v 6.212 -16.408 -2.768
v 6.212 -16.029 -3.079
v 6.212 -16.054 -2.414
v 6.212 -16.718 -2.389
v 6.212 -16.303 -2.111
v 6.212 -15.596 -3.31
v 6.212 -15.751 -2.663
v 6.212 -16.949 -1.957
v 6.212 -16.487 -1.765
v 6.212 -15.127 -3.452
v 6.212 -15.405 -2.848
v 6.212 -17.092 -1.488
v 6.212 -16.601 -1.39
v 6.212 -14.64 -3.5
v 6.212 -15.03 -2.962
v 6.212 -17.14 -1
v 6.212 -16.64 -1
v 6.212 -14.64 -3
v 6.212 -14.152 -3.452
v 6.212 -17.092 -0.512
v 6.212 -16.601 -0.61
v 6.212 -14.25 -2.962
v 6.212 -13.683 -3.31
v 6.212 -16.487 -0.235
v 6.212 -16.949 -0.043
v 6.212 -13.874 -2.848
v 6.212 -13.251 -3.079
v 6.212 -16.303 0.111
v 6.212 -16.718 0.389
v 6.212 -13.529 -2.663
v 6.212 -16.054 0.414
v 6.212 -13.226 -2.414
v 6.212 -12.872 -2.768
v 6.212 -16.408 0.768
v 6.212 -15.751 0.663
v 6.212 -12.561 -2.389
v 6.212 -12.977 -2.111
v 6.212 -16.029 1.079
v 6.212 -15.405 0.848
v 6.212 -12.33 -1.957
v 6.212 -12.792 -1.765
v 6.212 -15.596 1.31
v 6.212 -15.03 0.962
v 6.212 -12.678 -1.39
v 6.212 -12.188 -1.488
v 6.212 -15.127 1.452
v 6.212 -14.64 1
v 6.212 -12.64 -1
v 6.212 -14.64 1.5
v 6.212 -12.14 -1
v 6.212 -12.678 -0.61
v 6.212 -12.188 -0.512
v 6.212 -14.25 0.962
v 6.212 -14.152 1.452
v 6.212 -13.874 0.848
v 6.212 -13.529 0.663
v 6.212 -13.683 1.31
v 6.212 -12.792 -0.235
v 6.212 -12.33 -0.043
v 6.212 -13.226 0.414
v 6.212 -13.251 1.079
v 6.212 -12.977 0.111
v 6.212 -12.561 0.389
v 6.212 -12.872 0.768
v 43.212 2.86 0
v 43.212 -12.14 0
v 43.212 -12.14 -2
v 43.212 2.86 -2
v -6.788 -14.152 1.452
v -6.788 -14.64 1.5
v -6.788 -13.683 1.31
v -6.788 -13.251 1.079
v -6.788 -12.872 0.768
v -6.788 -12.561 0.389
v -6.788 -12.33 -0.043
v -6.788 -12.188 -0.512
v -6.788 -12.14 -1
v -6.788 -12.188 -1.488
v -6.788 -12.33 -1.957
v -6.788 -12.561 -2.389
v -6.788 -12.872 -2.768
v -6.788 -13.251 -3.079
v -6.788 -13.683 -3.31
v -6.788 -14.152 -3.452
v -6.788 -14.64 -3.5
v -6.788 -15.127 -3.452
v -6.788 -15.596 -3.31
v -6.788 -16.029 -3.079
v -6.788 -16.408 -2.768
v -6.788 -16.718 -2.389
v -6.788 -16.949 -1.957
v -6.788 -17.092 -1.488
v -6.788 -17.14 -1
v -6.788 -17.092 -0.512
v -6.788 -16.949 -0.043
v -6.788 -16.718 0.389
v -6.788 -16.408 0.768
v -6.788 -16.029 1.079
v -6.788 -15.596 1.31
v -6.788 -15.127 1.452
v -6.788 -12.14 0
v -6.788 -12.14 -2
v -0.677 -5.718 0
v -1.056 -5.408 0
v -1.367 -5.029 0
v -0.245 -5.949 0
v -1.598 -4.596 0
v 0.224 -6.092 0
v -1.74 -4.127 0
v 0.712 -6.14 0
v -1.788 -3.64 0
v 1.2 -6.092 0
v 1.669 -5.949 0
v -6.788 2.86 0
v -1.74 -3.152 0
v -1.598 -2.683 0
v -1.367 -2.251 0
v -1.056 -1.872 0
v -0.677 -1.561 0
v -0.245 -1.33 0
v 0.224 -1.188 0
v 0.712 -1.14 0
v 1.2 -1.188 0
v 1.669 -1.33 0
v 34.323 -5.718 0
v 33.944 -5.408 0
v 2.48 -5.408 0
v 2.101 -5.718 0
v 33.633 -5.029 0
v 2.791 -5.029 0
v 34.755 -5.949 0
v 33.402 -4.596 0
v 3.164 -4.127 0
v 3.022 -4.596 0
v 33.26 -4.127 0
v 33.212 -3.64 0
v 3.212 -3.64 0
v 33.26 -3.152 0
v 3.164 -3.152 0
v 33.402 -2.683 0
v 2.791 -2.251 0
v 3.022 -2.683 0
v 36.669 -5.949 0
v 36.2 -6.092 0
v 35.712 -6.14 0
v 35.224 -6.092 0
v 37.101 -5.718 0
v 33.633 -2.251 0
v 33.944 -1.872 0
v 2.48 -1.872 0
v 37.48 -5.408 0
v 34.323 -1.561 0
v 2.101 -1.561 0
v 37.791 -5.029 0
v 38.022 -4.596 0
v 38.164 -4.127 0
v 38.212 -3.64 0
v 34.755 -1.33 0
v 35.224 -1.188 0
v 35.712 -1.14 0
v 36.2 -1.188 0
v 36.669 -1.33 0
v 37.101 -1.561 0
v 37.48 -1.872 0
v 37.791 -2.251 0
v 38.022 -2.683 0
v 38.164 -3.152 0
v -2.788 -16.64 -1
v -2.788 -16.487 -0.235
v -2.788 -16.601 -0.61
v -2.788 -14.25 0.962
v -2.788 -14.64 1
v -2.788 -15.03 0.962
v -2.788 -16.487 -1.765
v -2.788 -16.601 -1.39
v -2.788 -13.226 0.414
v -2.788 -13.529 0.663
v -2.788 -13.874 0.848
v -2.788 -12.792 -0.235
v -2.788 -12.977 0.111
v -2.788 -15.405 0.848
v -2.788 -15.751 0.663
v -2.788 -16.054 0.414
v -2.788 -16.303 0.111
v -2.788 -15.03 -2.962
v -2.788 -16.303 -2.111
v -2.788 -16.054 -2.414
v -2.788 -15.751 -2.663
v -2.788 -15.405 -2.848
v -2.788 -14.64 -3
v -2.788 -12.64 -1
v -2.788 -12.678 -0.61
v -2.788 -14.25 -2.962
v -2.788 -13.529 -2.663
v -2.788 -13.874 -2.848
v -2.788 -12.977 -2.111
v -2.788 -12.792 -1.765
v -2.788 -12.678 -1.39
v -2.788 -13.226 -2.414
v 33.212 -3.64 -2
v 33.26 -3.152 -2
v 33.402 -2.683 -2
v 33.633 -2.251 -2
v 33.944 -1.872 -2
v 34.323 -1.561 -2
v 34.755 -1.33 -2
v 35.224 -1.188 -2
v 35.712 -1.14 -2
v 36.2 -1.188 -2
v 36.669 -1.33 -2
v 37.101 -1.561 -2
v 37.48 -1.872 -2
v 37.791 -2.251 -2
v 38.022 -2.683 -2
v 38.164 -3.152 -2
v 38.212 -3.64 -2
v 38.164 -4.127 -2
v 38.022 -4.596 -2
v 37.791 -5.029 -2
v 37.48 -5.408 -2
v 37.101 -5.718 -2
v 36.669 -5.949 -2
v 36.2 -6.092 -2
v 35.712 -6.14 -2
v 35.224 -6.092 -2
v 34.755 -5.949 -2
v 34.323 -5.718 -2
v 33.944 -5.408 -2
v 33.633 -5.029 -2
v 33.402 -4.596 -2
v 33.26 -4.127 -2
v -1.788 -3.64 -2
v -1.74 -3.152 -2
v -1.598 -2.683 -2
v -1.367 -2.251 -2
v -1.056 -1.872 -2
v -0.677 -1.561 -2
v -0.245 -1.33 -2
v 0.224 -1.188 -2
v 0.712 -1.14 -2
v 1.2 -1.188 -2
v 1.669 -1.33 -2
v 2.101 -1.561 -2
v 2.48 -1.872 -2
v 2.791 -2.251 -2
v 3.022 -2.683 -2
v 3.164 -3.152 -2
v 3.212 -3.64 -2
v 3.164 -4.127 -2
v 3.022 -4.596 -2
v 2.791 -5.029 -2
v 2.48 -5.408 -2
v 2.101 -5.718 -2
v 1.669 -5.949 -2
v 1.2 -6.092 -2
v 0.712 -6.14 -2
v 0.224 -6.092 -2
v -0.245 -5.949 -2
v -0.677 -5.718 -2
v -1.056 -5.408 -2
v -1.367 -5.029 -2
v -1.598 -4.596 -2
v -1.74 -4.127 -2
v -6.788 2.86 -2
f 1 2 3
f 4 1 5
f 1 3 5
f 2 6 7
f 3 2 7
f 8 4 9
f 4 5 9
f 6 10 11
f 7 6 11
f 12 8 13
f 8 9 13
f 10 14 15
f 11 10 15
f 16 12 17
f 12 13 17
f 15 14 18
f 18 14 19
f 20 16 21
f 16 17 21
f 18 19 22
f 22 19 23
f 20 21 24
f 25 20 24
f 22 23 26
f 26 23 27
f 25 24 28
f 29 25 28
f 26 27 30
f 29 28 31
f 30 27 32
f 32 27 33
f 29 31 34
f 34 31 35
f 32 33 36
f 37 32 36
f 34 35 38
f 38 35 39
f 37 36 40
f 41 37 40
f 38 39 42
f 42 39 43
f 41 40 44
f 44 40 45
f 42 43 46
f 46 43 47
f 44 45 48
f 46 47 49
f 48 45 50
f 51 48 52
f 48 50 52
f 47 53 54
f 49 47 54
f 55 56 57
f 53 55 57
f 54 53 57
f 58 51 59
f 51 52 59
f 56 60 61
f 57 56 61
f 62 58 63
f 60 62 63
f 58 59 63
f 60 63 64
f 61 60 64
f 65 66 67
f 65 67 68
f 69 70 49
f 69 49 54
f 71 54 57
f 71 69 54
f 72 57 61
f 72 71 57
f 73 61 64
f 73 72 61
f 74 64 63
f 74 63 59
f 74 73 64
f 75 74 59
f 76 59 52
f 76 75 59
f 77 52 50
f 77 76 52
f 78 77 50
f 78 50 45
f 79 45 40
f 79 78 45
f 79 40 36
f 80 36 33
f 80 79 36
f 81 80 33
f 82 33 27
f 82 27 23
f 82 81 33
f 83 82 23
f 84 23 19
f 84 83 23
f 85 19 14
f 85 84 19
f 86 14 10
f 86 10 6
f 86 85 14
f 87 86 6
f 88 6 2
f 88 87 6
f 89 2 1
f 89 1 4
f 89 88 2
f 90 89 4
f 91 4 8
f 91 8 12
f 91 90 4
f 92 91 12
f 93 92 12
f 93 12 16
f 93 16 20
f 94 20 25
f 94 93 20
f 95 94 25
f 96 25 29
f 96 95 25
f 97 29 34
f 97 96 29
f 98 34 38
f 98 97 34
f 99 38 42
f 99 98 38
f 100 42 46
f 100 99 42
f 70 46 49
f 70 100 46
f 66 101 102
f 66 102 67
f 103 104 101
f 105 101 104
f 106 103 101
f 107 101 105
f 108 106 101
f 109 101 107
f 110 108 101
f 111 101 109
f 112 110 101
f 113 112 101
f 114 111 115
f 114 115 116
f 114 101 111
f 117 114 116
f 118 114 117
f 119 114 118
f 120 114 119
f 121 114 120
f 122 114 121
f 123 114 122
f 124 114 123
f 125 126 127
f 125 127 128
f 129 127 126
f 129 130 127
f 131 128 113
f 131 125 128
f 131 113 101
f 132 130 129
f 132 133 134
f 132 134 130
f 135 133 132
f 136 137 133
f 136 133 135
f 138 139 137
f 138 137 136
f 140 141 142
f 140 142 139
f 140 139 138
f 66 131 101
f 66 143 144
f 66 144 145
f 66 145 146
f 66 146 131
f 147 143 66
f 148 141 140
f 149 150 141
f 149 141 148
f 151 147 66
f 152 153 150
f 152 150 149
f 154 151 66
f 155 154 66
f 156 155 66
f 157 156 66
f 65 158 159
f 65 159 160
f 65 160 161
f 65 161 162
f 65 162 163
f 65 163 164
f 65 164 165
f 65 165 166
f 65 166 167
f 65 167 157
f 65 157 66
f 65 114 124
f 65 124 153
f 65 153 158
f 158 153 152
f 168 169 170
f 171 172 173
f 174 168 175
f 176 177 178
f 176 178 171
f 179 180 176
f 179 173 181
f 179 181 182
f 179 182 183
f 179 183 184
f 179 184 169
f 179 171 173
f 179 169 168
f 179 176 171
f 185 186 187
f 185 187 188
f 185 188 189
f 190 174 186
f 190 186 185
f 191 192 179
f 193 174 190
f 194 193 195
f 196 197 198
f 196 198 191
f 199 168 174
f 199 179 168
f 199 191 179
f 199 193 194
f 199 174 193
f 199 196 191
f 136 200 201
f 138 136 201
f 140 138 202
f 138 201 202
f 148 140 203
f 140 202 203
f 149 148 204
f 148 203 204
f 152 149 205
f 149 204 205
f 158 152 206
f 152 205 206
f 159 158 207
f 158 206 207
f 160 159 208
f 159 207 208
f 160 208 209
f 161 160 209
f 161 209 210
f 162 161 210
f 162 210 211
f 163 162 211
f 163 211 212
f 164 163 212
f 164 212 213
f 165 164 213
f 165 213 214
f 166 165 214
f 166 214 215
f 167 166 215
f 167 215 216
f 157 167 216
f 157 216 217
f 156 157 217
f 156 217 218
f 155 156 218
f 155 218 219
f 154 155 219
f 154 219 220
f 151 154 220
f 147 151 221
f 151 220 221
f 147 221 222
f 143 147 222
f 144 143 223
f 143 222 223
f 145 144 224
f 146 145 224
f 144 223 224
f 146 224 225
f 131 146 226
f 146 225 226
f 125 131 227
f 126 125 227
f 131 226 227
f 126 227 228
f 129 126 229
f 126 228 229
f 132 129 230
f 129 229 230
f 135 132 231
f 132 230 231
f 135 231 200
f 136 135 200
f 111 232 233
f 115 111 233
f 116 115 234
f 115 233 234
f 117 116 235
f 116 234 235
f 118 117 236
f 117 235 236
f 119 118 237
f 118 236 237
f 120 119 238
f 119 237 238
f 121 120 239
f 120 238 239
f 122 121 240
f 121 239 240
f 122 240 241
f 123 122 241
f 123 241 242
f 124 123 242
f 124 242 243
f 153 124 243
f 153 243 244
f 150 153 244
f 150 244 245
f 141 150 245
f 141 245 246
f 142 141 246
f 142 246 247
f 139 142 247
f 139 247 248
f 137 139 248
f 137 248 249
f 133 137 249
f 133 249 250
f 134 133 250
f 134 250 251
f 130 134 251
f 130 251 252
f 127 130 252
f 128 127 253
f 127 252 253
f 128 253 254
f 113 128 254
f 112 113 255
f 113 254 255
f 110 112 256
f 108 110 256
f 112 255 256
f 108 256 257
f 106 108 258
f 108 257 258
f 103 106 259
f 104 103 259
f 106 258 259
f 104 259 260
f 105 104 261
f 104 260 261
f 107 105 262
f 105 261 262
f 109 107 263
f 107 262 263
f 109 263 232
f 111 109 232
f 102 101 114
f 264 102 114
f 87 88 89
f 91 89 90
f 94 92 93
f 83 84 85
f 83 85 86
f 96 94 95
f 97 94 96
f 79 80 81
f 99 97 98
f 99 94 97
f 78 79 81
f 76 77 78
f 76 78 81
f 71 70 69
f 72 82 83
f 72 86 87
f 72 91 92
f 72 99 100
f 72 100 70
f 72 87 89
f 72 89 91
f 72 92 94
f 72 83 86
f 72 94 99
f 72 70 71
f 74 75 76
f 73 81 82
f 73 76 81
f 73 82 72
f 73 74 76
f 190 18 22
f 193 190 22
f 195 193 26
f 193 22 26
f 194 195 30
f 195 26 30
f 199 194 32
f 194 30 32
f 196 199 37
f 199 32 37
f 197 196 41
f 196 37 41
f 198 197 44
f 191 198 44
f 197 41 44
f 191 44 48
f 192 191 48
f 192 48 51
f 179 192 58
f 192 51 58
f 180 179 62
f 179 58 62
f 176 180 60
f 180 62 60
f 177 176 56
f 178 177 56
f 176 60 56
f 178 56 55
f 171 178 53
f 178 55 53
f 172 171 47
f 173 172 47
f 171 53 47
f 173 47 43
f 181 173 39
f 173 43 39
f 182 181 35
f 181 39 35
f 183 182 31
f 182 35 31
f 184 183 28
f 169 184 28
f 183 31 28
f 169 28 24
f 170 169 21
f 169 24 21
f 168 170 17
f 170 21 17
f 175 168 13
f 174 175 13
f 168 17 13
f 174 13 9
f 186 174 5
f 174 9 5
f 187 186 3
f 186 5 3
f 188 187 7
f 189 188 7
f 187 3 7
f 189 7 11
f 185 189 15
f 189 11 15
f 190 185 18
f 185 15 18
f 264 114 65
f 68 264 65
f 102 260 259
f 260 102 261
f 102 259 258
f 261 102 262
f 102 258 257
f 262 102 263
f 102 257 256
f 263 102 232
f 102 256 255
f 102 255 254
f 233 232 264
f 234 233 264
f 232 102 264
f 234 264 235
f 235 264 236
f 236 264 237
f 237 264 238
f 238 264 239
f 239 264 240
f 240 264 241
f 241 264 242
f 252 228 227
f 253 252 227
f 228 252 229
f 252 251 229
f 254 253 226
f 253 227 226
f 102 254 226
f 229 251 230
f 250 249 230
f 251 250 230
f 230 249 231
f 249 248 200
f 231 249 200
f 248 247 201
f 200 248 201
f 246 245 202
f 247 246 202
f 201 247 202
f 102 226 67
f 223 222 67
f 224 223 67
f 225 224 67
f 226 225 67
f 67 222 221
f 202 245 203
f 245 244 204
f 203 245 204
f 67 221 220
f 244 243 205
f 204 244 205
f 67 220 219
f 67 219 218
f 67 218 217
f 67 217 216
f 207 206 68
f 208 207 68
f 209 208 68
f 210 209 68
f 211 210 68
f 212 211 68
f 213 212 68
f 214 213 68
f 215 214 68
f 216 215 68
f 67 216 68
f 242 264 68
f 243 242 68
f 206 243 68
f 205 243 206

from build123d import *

# Parameters (mm, degrees)
ESQUISSE1_W             = 50
ESQUISSE1_H             = 15
BOSS_EXTRU_1_DEPTH      = 2
ESQUISSE2_R             = 2.5
BOSS_EXTRU_2_DEPTH      = 13
ESQUISSE3_R             = 2
ENL_V_MAT_EXTRU_1_DEPTH = 9
ESQUISSE4_R             = 2.5
ENL_V_MAT_EXTRU_2_DEPTH = 47.618550096


with BuildPart() as part:
    # Esquisse1 → Boss.-Extru.1 (new body)
    with BuildSketch(Plane.XY):
        with Locations((18.211903391, -4.639737991)):
            Rectangle(ESQUISSE1_W, ESQUISSE1_H)
    extrude(amount=-BOSS_EXTRU_1_DEPTH)

    # Esquisse4 → Enlèv. mat.-Extru.2 (cut, through all)
    with BuildSketch(Plane(origin=(0, 0, -2), x_dir=(-1, 0, 0), z_dir=(0, 0, -1))):
        with Locations((-35.711903391, -3.639737991)):
            Circle(ESQUISSE4_R)
        with Locations((-0.711903391, -3.639737991)):
            Circle(ESQUISSE4_R)
    extrude(amount=-ENL_V_MAT_EXTRU_2_DEPTH, mode=Mode.SUBTRACT)


with BuildPart() as body_2:
    # Esquisse2 → Boss.-Extru.2 (new body)
    with BuildSketch(Plane.ZY.offset(6.788096609)):
        with Locations((-1, -14.639737991)):
            Circle(ESQUISSE2_R)
    extrude(amount=-BOSS_EXTRU_2_DEPTH)

    # Esquisse3 → Enlèv. mat.-Extru.1 (cut)
    with BuildSketch(Plane(origin=(6.211903391, 0, 0), x_dir=(0, 0, -1), z_dir=(1, 0, 0))):
        with Locations((1, -14.639737991)):
            Circle(ESQUISSE3_R)
    extrude(amount=-ENL_V_MAT_EXTRU_1_DEPTH, mode=Mode.SUBTRACT)


solid = Compound([part.part, body_2.part])
